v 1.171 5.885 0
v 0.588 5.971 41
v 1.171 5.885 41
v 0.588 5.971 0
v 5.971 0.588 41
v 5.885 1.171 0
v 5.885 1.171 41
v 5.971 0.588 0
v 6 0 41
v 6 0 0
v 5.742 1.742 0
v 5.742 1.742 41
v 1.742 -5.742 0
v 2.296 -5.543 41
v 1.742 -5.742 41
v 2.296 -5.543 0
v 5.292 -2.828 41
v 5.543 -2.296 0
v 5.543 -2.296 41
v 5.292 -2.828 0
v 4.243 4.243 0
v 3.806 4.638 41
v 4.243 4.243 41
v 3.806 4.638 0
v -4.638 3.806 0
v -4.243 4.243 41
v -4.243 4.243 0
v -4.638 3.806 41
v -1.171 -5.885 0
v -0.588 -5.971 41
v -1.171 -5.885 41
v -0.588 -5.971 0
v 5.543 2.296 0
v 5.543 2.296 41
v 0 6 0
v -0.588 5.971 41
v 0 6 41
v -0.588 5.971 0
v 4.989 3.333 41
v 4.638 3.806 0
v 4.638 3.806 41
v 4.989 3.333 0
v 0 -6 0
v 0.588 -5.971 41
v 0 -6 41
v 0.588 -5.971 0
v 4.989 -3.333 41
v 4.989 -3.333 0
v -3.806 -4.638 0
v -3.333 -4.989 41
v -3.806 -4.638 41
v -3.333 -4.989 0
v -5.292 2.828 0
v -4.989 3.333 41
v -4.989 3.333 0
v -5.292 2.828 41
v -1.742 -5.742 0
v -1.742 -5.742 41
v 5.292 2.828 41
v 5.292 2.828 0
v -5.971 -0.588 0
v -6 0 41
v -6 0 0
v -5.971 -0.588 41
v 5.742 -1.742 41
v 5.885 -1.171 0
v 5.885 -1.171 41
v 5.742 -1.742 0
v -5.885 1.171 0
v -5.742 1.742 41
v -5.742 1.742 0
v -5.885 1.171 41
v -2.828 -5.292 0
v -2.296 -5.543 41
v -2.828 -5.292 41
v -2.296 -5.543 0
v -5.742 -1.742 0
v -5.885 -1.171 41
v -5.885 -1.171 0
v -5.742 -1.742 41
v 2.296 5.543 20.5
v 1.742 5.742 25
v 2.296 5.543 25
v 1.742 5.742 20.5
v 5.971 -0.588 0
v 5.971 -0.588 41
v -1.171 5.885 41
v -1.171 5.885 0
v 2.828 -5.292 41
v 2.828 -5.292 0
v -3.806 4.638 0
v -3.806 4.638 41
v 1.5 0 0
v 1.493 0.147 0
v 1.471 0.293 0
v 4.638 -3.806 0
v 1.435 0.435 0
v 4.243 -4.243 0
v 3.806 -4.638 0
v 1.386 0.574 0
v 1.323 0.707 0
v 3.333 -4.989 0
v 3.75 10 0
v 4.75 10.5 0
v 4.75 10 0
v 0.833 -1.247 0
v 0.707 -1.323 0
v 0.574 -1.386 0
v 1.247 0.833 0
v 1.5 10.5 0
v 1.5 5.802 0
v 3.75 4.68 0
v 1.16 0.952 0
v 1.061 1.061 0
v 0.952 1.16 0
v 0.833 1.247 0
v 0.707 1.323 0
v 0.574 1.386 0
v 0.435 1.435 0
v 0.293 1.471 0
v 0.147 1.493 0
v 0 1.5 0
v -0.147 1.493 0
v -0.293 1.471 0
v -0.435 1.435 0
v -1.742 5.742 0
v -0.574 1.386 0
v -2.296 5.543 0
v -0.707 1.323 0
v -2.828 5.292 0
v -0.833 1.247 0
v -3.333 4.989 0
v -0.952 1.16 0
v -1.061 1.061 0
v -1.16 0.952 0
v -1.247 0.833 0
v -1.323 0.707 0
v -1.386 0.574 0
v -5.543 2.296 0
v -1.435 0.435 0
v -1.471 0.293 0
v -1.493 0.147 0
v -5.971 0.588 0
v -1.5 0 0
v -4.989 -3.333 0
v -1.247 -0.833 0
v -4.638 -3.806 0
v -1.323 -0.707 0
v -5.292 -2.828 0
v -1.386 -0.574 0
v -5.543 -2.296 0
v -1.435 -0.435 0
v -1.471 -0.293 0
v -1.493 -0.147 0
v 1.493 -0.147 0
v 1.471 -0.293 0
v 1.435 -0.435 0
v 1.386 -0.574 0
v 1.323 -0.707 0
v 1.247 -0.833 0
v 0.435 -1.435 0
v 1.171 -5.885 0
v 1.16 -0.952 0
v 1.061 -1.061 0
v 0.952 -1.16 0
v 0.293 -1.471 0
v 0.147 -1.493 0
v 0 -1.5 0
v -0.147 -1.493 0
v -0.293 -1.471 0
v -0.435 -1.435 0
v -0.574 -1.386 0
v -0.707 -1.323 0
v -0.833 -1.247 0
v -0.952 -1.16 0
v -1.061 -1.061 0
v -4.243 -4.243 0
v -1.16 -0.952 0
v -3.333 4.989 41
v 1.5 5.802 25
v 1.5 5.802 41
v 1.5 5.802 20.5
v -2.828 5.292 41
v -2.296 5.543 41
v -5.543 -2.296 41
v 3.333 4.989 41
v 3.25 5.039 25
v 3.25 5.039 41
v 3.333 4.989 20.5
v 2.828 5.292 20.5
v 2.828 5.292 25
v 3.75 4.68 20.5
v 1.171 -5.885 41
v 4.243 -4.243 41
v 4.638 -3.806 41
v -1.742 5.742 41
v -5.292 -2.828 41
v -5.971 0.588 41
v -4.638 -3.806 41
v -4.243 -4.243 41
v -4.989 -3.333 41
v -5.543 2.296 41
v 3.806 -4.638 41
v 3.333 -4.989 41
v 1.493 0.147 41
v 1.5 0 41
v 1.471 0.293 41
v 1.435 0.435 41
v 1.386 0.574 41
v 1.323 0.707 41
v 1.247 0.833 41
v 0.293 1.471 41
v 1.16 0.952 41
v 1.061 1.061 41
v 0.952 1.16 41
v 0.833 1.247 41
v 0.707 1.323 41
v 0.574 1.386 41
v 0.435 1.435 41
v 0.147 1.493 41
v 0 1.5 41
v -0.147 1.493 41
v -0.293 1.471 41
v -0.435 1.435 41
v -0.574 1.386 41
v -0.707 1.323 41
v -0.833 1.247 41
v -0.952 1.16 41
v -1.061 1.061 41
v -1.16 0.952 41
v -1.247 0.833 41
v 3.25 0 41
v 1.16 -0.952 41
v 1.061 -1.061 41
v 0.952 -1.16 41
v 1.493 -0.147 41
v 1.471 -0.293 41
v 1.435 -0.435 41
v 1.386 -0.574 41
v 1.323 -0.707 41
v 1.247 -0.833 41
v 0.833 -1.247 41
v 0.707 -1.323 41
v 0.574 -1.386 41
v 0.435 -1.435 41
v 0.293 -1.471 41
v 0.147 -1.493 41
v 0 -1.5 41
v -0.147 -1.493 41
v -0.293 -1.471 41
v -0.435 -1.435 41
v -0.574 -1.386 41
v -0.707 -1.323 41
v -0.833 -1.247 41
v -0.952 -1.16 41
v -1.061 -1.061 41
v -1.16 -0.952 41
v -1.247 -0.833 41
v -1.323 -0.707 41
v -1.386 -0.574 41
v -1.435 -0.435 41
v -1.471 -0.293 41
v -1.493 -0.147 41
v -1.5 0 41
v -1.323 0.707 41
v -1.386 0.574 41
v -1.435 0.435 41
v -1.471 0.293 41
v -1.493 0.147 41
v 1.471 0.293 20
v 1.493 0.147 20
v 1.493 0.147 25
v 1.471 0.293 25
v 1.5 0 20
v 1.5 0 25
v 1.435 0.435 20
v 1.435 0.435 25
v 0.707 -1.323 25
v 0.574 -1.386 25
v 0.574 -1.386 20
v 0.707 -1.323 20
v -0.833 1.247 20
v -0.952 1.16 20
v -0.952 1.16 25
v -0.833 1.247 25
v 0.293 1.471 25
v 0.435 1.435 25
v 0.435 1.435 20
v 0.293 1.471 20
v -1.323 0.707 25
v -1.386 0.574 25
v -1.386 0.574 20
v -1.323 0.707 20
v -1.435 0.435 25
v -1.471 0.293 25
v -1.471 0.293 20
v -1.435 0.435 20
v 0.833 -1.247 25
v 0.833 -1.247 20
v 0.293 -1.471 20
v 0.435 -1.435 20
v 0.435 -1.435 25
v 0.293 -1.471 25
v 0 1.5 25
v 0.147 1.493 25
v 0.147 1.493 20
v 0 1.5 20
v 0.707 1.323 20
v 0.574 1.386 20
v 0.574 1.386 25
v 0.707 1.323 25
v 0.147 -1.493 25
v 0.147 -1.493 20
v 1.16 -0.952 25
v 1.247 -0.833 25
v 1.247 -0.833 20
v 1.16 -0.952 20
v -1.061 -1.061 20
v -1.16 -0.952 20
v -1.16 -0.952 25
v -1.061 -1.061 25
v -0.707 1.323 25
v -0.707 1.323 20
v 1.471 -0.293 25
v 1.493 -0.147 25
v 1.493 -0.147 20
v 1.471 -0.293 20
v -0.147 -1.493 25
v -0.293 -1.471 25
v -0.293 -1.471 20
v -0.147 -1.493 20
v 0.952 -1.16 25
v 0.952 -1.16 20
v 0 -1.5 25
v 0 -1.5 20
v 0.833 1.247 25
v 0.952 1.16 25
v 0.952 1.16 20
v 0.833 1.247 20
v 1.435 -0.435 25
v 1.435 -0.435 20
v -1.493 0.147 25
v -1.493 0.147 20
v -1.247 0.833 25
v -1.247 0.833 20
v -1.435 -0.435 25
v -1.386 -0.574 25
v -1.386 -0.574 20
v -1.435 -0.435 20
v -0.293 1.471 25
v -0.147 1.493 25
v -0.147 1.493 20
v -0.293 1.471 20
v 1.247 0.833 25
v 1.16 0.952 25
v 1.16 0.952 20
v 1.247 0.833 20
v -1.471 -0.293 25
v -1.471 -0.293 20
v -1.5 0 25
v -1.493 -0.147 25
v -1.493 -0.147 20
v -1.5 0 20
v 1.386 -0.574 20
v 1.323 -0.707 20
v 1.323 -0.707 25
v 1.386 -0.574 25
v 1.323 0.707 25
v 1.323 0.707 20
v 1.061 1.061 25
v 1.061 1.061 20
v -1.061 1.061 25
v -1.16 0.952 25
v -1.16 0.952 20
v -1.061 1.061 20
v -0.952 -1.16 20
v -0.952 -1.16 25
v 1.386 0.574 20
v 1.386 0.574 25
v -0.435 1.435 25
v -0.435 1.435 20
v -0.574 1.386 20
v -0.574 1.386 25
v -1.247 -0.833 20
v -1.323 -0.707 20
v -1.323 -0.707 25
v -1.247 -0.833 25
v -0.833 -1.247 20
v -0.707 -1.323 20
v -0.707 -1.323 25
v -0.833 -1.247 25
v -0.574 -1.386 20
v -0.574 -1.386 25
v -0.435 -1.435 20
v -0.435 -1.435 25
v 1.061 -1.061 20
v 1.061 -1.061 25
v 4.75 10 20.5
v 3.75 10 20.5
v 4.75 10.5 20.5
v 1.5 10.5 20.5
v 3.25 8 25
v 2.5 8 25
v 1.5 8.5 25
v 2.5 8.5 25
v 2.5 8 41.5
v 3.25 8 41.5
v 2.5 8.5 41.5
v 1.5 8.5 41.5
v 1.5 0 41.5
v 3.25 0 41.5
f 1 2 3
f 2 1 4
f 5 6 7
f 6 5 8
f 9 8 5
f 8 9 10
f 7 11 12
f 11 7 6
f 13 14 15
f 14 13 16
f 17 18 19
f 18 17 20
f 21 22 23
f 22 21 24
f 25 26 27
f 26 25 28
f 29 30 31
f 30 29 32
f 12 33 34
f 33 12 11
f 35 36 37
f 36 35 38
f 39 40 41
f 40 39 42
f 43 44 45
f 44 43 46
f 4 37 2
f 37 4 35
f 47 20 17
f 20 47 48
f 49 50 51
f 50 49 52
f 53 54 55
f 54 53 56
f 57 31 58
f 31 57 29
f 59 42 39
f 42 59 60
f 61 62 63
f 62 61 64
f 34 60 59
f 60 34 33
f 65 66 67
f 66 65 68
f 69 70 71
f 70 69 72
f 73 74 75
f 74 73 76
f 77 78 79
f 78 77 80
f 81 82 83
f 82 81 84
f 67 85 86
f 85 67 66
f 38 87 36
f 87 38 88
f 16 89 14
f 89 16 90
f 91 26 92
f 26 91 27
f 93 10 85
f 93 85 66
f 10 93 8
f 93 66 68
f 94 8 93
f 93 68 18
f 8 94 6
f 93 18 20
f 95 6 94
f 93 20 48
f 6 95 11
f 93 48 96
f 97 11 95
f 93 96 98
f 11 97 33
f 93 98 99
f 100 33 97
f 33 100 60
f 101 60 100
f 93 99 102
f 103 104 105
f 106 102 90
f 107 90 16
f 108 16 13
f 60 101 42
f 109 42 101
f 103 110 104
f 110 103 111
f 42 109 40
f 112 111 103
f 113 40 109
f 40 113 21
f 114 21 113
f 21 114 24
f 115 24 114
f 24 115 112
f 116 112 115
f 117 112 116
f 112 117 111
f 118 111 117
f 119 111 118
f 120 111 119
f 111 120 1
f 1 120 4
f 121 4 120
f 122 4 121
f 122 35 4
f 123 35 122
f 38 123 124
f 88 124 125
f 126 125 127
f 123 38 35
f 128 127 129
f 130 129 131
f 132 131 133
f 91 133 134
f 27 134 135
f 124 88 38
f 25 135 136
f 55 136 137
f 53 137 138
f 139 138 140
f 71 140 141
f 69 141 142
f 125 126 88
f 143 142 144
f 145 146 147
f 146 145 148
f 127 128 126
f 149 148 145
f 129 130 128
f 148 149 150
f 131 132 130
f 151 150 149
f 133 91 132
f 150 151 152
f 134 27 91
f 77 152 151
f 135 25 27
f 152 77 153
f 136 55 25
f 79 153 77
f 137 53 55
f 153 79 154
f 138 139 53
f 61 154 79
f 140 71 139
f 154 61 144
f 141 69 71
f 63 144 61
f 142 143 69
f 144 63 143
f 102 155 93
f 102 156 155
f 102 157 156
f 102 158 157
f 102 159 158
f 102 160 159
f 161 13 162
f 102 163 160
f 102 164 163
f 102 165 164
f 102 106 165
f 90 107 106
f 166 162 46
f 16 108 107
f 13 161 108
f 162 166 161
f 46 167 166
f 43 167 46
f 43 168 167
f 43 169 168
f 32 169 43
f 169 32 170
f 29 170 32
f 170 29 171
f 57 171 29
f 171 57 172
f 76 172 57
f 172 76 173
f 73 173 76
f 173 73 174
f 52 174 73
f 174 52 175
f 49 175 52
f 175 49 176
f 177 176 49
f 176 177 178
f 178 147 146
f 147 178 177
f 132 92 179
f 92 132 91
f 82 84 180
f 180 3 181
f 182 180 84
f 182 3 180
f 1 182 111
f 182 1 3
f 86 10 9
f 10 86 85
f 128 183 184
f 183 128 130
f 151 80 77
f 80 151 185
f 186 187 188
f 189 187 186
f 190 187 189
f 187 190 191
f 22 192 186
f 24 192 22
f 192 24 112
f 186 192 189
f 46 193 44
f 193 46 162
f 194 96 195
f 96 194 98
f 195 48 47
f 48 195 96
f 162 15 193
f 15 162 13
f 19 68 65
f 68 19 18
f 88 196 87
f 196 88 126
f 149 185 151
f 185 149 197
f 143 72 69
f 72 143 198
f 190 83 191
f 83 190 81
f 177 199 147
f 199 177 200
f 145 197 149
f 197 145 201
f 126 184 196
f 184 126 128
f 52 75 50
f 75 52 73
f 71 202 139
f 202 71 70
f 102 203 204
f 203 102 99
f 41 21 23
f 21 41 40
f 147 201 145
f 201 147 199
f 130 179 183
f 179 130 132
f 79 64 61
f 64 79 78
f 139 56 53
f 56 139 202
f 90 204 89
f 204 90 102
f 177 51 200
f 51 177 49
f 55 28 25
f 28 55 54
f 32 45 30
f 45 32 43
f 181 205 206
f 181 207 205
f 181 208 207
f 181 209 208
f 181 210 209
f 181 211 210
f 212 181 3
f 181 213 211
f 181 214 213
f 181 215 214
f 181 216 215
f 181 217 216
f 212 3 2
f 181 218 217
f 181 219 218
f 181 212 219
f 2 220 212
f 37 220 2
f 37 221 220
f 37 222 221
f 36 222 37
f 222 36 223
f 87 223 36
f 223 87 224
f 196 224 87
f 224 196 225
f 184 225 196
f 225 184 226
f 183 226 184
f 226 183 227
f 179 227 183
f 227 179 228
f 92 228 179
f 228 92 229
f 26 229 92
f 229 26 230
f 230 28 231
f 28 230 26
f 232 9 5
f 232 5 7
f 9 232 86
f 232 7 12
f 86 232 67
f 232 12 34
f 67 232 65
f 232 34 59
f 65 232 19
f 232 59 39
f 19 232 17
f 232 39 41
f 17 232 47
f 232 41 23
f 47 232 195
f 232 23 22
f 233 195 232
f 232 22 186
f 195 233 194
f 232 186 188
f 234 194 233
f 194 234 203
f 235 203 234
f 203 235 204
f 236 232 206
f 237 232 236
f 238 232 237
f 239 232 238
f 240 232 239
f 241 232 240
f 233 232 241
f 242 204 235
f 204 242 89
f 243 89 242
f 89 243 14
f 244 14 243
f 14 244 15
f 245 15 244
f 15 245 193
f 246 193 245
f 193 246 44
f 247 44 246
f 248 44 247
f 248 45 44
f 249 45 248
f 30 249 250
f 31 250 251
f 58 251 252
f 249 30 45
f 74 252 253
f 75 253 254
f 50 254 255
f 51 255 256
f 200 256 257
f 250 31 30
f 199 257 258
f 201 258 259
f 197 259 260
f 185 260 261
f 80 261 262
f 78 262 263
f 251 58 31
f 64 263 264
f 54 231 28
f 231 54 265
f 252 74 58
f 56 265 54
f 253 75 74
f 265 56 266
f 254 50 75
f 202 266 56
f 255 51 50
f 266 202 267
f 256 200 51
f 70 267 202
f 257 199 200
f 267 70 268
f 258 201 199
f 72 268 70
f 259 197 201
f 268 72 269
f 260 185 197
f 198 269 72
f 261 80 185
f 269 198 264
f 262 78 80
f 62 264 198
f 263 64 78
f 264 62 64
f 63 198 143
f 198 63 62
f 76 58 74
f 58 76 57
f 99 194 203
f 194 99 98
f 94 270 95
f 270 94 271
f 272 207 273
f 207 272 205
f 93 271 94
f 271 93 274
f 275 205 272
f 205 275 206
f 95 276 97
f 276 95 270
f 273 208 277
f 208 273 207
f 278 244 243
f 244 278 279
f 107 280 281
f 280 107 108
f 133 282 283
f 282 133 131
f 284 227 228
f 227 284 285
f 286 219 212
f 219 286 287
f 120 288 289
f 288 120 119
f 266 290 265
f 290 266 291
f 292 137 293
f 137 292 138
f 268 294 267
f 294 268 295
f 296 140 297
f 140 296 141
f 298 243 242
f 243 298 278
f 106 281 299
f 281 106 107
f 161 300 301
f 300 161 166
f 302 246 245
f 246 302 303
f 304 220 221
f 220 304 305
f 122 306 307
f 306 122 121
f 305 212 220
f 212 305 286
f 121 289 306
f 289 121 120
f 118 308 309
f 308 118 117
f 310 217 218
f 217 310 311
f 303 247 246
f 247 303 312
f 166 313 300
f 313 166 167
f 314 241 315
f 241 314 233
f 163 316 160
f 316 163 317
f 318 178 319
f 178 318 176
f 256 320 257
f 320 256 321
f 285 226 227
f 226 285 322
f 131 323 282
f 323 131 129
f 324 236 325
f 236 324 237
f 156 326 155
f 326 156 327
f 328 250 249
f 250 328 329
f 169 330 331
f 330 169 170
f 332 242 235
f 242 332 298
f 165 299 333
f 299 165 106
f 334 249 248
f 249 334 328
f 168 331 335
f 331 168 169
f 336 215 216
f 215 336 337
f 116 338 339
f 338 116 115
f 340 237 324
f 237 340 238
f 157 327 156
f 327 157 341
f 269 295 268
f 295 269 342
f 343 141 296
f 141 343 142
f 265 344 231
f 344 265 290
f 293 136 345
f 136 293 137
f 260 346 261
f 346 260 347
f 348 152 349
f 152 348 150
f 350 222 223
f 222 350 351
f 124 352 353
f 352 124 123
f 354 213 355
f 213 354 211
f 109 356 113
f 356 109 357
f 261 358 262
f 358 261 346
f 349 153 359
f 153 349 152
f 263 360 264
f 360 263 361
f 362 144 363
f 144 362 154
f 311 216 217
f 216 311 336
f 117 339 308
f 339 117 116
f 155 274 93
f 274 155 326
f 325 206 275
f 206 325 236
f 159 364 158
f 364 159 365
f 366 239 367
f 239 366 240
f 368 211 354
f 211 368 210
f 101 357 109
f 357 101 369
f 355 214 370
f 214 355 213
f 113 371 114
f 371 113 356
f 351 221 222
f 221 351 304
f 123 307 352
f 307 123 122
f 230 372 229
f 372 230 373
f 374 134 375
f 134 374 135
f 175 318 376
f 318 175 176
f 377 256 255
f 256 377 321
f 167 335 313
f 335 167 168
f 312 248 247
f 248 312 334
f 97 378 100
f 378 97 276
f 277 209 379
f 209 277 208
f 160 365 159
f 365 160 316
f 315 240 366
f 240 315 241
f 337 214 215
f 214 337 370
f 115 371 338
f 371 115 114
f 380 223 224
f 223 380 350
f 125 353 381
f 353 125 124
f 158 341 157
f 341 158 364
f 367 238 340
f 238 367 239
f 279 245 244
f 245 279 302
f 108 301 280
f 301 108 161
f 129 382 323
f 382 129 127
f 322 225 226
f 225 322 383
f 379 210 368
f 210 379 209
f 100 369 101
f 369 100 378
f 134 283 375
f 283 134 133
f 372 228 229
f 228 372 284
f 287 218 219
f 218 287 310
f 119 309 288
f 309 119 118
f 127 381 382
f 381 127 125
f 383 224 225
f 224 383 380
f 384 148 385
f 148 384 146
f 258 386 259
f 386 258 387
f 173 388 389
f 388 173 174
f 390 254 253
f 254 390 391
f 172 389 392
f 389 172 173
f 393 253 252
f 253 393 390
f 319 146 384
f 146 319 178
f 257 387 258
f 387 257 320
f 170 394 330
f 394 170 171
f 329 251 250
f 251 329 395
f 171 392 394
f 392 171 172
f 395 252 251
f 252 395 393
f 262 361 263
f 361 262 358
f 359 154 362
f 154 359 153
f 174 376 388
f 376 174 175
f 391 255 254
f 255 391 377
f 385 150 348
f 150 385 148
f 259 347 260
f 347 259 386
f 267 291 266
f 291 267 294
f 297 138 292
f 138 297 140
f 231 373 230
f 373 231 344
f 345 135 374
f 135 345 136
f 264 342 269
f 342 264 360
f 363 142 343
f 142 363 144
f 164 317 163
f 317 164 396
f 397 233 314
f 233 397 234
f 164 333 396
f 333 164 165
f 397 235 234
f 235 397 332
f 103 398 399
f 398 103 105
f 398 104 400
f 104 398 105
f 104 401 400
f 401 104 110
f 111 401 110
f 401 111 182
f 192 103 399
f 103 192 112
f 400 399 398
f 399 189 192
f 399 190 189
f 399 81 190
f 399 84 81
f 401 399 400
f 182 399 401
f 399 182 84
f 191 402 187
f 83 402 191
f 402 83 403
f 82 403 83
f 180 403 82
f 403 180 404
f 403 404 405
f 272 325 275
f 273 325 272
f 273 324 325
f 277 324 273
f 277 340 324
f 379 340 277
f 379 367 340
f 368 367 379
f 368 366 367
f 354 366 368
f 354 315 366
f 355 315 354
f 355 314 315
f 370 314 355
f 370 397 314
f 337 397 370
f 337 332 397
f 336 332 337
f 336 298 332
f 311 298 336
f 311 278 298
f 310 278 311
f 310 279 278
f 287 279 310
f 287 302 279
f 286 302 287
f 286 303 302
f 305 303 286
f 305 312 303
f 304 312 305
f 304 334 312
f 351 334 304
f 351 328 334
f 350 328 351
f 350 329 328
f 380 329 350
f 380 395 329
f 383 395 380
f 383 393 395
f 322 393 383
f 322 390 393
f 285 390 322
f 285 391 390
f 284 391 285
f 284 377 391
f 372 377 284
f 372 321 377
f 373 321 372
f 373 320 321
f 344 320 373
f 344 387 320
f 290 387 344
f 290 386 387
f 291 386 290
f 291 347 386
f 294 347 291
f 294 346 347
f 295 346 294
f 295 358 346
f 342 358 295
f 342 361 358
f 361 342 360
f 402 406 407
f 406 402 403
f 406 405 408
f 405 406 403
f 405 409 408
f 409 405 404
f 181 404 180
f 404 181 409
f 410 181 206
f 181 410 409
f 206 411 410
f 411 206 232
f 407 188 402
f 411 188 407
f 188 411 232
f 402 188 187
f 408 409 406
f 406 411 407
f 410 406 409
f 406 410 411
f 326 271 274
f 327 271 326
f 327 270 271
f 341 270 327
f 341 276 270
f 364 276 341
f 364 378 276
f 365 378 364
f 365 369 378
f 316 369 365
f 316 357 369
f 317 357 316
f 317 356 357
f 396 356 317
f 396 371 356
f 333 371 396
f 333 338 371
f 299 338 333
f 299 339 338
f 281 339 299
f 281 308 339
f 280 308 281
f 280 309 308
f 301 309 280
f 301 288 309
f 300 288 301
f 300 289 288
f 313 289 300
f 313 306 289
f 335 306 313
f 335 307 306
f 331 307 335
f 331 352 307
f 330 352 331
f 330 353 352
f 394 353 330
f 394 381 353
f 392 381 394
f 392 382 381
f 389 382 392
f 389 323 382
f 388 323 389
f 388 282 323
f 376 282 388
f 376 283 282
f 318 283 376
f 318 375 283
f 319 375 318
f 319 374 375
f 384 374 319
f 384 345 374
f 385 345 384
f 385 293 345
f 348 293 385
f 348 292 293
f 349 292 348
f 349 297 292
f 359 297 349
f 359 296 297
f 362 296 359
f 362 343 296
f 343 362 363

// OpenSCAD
// Hose-Barb Reducer Design (Corrected)
// Units: mm
// Orientation: Standing upright on XY plane, building +Z

// --- Dimensions ---
// Main bore diameter
$main_bore_d = 3.0;
$main_bore_r = $main_bore_d / 2.0;

// Section 1: 8mm Tubing Interface (z=0 to z=20)
$sec1_start_z = 0;
$sec1_end_z = 20;
$sec1_barb_height = 10;
$sec1_barb_bottom_od = 7.5;
$sec1_barb_top_od = 9.5;
$sec1_barb_count = 2;
$sec1_barb_spacing = 12; // Center-to-center distance between barbs

// Section 2: Collar (z=20 to z=25)
$sec2_start_z = 20;
$sec2_end_z = 25;
$sec2_collar_od = 12;
$sec2_collar_id = $main_bore_d; // Matches main bore

// Section 3: 5mm Tubing Interface (z=25 to z=41)
$sec3_start_z = 25;
$sec3_end_z = 41;
$sec3_barb_height = 8;
$sec3_barb_bottom_od = 6.5;
$sec3_barb_top_od = 5.0;
$sec3_barb_count = 2;
$sec3_barb_spacing = 10; // Center-to-center distance between barbs

// --- Helper: Create Barb Profile Points ---
// Returns a list of [x, y] points for the cross-section of one barb
// z_start, z_end: The Z range of the barb
// r_bottom, r_top: Radii at bottom and top
// r_inner: Radius of the main bore (to ensure hole goes through)
function get_barb_points(z_start, z_end, r_bottom, r_top, r_inner) = 
    [
        // Bottom flat face (inner radius to outer radius)
        [r_inner, 0],
        [r_bottom, 0],
        // Taper up
        [r_bottom, z_end - z_start],
        [r_top, z_end - z_start],
        // Step out (flat top face)
        [r_top, z_end - z_start + 0.5],
        [r_inner, z_end - z_start + 0.5],
        // Close loop
        [r_inner, 0]
    ];

// --- Main Build ---

// We build the part in three main components:
// 1. The Main Body (Cylinder with central bore)
// 2. The Barbs (Union of all barb shapes)
// 3. The Collar (Cylinder)
// Then we Union them all together.

$fn = 64;

// 1. Main Body
// Height must cover the full length (41mm)
// Radius must be large enough to contain the widest part of the barbs (9.5mm)
// We add a tiny bit of safety margin for the collar calculation if needed, but 9.5 is the max OD.
// However, the collar is 12mm, so the main body radius must be at least 6mm.
// Let's make the main body radius 6mm (12mm OD) to cover the collar, 
// and the barbs will be added on top of this base.
$main_body_r = $sec2_collar_od / 2.0; 

translate([0, 0, 0])
difference() {
    // Outer shell of the main body
    cylinder(h = $sec3_end_z, r = $main_body_r, $fn = 64);
    
    // Inner bore through the whole length
    cylinder(h = $sec3_end_z, r = $main_bore_r, $fn = 64);
}

// 2. Section 1 Barbs (8mm tubing)
// Stacked at z=0 and z=10
translate([0, 0, 0])
union() {
    for (i = [0, 1]) {
        $z_pos = i * $sec1_barb_height;
        
        // Calculate radii
        $r_bottom = $sec1_barb_bottom_od / 2.0;
        $r_top = $sec1_barb_top_od / 2.0;
        
        // Get profile points
        $pts = get_barb_points($z_pos, $z_pos + $sec1_barb_height, $r_bottom, $r_top, $main_bore_r);
        
        // Extrude the profile
        // The height of extrusion is the barb height + the step height (0.5mm)
        $extrude_h = $sec1_barb_height + 0.5;
        
        translate([0, 0, $z_pos])
        linear_extrude(height = $extrude_h, center = false, convexity = 3)
        polygon(points = $pts);
    }
}

// 3. Section 2 Collar (z=20 to z=25)
translate([0, 0, $sec2_start_z])
cylinder(h = $sec2_end_z - $sec2_start_z, r = $sec2_collar_od / 2.0, $fn = 64);

// 4. Section 3 Barbs (5mm tubing)
// Stacked at z=25 and z=33
translate([0, 0, 0])
union() {
    for (i = [0, 1]) {
        $z_pos = $sec3_start_z + i * $sec3_barb_height;
        
        // Calculate radii
        $r_bottom = $sec3_barb_bottom_od / 2.0;
        $r_top = $sec3_barb_top_od / 2.0;
        
        // Get profile points
        $pts = get_barb_points($z_pos, $z_pos + $sec3_barb_height, $r_bottom, $r_top, $main_bore_r);
        
        // Extrude the profile
        $extrude_h = $sec3_barb_height + 0.5;
        
        translate([0, 0, $z_pos])
        linear_extrude(height = $extrude_h, center = false, convexity = 3)
        polygon(points = $pts);
    }
}
